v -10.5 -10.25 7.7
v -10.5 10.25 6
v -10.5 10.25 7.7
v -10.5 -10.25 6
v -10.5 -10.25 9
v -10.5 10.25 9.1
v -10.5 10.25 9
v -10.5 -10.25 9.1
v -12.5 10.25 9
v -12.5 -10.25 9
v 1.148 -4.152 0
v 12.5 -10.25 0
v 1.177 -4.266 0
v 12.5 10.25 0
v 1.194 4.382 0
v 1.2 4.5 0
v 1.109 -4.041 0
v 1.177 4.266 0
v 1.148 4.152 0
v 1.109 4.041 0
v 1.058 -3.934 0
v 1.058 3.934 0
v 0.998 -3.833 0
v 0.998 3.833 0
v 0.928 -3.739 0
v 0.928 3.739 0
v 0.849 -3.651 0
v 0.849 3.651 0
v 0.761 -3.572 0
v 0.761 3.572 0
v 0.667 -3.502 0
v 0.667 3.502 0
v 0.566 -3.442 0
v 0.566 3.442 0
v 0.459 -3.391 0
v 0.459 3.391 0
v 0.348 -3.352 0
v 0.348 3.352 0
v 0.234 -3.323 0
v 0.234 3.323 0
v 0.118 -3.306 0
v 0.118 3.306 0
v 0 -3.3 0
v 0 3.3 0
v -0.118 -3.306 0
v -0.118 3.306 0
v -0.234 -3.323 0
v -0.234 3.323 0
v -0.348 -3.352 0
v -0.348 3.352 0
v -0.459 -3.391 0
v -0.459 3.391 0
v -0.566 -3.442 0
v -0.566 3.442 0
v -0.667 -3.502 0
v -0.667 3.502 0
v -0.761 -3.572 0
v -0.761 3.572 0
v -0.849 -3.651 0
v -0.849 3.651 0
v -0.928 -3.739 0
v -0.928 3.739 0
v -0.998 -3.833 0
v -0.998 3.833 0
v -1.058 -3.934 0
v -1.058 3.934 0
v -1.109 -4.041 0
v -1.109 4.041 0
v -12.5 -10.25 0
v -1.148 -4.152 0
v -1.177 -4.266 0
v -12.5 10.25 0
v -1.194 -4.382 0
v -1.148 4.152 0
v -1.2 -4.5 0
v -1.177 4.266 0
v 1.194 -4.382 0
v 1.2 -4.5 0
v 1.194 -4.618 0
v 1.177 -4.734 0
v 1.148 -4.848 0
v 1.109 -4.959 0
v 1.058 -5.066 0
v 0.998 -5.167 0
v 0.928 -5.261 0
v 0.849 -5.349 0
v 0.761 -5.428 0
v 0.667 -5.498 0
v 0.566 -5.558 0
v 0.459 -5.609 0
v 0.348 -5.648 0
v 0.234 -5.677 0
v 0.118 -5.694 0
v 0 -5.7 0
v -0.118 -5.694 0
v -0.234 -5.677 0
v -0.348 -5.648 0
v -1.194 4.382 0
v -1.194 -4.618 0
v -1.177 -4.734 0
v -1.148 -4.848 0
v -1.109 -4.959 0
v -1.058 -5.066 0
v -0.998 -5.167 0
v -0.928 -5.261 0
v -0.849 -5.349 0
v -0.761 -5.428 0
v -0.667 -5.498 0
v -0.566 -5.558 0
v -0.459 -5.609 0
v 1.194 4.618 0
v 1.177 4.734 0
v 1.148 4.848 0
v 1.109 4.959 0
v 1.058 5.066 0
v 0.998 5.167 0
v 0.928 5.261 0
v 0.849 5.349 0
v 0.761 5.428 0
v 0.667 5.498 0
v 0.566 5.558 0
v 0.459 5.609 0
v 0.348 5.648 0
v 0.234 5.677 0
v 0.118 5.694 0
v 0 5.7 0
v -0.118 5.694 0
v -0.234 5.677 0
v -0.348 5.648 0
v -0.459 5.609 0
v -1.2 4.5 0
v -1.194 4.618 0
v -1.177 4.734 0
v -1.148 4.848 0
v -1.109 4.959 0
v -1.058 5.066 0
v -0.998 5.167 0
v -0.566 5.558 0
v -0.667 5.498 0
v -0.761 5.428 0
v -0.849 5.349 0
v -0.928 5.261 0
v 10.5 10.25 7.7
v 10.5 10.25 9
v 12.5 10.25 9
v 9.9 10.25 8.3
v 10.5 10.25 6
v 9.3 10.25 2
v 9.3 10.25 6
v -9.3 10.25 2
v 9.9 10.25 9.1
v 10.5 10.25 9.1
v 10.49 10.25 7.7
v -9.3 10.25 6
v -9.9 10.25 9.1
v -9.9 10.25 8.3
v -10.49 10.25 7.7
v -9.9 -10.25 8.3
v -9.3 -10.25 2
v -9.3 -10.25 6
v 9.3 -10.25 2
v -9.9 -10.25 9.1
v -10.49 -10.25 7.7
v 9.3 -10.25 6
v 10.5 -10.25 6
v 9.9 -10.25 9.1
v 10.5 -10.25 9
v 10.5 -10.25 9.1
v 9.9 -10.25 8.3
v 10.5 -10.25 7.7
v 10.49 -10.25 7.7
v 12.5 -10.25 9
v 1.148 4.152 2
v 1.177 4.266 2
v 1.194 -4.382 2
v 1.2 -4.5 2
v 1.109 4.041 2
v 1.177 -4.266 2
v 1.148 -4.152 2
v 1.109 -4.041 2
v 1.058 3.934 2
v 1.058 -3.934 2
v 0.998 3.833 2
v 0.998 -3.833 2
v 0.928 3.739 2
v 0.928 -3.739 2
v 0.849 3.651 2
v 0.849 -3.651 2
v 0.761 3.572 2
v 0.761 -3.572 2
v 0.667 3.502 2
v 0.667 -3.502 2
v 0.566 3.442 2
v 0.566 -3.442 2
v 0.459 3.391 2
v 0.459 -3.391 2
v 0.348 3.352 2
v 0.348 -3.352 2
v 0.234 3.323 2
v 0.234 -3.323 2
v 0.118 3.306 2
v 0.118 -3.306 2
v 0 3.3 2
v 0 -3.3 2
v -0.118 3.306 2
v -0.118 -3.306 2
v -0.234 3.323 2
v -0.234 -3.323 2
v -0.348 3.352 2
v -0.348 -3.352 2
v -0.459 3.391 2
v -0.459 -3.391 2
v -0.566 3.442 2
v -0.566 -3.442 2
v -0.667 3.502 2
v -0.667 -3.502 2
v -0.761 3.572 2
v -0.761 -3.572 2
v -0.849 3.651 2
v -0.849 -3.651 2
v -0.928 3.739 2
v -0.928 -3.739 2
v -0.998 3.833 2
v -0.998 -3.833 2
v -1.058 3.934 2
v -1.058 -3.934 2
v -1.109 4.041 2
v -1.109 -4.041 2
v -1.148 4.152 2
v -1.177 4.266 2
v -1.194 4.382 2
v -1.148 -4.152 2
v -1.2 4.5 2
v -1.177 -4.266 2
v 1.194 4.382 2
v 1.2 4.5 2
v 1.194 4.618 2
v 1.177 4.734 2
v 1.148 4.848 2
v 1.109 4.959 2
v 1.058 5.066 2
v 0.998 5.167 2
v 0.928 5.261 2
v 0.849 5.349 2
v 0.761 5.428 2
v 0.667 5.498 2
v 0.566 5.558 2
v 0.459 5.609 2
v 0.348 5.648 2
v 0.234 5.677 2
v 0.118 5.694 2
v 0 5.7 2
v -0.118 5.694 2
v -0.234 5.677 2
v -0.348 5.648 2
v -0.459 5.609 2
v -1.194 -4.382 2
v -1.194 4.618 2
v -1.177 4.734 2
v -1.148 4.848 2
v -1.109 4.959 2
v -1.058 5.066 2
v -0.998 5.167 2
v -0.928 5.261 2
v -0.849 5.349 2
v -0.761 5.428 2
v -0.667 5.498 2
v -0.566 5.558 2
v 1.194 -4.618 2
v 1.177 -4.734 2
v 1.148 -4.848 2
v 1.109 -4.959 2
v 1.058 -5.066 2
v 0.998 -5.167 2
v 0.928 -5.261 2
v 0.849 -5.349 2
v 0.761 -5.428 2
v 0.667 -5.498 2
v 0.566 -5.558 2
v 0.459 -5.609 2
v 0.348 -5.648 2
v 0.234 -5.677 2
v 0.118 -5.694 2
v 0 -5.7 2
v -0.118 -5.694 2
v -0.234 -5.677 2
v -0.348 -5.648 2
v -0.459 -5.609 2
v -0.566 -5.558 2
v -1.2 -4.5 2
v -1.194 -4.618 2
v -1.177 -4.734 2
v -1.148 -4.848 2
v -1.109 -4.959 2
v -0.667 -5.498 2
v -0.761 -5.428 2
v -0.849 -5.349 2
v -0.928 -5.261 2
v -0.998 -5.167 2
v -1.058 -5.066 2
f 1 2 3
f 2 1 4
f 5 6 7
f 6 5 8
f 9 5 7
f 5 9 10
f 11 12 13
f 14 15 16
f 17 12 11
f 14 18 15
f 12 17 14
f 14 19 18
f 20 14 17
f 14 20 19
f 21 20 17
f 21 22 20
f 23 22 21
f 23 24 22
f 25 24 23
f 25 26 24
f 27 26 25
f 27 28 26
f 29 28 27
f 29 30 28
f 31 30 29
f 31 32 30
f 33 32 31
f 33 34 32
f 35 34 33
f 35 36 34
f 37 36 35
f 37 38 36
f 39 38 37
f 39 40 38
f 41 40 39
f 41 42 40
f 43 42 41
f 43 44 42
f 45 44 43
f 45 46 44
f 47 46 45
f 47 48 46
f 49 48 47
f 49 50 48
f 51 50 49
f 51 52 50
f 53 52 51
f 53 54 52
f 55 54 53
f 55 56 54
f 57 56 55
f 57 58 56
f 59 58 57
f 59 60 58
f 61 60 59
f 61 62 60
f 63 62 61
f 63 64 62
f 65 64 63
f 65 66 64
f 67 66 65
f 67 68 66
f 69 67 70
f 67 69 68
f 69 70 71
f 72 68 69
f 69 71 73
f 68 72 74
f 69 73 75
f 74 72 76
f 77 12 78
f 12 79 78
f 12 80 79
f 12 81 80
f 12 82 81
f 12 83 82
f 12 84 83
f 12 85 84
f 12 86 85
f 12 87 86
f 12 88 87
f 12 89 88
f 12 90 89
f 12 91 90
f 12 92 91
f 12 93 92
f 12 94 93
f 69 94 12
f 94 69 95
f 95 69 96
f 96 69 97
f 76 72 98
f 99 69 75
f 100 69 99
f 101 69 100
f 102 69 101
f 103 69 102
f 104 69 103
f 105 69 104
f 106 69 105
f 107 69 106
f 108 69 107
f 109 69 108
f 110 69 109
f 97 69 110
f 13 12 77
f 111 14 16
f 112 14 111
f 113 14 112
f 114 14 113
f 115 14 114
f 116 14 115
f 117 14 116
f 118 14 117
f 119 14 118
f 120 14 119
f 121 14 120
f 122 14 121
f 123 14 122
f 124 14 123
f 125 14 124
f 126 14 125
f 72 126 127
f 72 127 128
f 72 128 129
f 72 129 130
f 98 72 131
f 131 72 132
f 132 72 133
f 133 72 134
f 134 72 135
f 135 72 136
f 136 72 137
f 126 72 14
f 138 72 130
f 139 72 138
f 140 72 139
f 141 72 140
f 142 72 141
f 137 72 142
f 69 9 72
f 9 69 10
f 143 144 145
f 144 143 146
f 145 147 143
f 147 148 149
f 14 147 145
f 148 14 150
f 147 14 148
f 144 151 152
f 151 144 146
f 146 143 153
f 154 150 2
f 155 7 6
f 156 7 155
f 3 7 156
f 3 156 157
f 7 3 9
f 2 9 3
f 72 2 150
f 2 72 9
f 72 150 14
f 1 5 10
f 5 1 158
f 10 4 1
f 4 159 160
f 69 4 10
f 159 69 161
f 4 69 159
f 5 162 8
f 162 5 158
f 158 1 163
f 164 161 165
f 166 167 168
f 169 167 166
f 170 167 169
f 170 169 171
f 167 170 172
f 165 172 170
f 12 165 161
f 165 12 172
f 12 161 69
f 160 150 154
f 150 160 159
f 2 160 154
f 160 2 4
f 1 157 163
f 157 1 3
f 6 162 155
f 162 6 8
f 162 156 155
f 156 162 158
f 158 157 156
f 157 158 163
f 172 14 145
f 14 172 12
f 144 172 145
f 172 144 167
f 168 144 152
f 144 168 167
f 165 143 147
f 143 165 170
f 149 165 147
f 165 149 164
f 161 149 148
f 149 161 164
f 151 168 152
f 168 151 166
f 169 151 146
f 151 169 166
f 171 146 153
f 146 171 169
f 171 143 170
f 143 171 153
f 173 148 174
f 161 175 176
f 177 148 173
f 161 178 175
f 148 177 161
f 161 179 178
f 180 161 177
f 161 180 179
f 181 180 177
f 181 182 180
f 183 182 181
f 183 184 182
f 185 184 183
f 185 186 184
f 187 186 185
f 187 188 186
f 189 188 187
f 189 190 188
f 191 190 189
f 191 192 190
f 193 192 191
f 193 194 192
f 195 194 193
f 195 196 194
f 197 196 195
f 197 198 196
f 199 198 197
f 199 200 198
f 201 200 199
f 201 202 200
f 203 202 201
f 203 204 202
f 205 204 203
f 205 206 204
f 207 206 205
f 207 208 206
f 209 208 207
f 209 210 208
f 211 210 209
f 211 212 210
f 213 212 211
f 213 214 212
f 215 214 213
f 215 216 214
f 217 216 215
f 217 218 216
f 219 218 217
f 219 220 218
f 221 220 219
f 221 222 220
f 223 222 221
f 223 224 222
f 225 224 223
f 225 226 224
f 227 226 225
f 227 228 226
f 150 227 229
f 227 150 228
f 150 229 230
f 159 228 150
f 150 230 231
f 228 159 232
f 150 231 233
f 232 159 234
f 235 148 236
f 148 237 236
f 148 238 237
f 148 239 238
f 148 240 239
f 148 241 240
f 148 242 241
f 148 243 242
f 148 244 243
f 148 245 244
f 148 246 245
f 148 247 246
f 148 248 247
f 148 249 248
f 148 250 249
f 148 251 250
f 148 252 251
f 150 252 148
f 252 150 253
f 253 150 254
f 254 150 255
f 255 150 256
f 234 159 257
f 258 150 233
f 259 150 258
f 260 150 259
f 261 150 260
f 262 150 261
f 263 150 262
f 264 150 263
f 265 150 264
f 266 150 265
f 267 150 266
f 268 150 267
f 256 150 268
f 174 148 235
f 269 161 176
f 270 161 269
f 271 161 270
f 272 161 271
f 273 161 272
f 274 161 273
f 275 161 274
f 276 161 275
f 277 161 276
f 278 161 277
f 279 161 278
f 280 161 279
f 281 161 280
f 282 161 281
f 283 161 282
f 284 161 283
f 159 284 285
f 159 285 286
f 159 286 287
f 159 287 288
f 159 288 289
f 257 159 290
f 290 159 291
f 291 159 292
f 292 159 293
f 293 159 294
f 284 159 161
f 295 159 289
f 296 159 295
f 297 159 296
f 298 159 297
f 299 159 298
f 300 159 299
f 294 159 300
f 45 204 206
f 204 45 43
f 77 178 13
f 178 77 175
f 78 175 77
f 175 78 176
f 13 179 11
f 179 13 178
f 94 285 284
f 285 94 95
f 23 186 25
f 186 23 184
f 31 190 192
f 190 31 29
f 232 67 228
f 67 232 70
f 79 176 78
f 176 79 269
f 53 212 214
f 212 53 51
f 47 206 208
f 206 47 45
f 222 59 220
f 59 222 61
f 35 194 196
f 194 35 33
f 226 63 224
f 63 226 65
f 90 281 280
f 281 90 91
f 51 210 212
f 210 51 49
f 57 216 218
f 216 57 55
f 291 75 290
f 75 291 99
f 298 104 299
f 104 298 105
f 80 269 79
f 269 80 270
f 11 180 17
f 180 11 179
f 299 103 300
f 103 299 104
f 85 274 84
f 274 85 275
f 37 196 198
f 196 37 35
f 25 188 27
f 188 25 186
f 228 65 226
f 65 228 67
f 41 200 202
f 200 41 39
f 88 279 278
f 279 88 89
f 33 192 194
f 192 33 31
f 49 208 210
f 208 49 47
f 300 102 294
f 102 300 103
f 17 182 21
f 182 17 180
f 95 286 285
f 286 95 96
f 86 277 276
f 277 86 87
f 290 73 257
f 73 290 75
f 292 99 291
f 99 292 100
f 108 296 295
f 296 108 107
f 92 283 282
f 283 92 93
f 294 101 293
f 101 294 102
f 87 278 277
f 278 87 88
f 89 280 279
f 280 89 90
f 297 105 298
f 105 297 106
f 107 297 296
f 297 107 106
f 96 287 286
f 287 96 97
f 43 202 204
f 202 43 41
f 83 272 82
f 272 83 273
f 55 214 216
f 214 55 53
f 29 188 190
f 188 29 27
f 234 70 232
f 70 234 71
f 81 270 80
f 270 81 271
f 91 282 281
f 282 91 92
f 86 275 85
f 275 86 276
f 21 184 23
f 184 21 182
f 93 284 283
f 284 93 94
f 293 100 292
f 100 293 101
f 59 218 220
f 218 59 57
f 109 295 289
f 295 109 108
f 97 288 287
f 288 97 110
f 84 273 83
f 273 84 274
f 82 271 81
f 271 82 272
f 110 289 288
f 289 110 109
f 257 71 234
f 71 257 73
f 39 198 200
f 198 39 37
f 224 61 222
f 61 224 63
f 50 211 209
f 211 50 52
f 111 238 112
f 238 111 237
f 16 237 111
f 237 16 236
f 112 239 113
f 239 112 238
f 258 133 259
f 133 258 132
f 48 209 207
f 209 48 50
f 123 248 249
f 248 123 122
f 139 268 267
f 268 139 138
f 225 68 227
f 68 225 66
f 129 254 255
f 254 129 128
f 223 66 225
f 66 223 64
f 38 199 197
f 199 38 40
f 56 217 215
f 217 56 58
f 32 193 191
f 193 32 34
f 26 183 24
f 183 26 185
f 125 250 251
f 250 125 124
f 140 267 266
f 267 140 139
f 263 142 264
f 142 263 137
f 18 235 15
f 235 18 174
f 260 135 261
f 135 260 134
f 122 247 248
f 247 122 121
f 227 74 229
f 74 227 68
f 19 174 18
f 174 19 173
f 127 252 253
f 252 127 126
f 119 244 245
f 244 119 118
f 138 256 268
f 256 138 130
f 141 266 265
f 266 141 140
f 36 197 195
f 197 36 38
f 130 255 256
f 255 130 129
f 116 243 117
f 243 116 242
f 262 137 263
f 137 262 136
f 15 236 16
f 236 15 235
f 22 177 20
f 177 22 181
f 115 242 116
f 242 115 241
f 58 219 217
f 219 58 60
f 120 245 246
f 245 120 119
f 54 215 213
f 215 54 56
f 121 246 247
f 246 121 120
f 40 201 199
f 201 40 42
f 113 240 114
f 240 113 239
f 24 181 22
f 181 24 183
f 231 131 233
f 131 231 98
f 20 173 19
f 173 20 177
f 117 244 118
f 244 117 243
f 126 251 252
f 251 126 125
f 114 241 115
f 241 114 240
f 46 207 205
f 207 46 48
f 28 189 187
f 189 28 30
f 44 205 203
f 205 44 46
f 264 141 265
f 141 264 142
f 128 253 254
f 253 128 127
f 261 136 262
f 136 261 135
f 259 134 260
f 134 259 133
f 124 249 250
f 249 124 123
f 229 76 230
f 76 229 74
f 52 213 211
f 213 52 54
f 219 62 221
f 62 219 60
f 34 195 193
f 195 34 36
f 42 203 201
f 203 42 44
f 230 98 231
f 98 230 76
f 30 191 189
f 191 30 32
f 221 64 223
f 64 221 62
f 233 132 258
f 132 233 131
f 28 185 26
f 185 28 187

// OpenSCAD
// file: ../lib.scad
// Solar Rover - shared helper modules
include <config.scad>

// Rounded rectangle plate, centred in XY, sitting on Z=0.
module rbox(size, r=4) {
    x = size[0]; y = size[1]; z = size[2];
    hull() for (sx=[-1,1], sy=[-1,1])
        translate([sx*(x/2-r), sy*(y/2-r), 0]) cylinder(r=r, h=z);
}

// Vertical hole through everything (subtract). Centred on the origin.
module hole(d, h=200) { translate([0,0,-h/2]) cylinder(d=d, h=h); }

// Heat-set insert pocket opening upward at Z=top.
module insert_m3(top) { translate([0,0,top-m3_insert_h]) cylinder(d=m3_insert_d, h=m3_insert_h+0.01); }
module insert_m25(top) { translate([0,0,top-4.5]) cylinder(d=m25_insert_d, h=4.51); }

// Boss for an insert: cylinder from z0 to z1, with insert pocket at the top.
module insert_boss_m3(z0, z1, od=8) {
    difference() {
        translate([0,0,z0]) cylinder(d=od, h=z1-z0);
        insert_m3(z1);
    }
}

// Slot of length l (centre-to-centre) along X, diameter d.
module slot(l, d, h=200) {
    hull() for (sx=[-1,1]) translate([sx*l/2,0,-h/2]) cylinder(d=d, h=h);
}

// Counterbored M3 clearance hole, head at Z=top going down.
module m3_cbore(top, depth=m3_head_h) {
    hole(m3_clear);
    translate([0,0,top-depth]) cylinder(d=m3_head_d, h=depth+50);
}

// Captive hex nut pocket, opening at Z=z (nut goes in from that face).
module m3_nut_pocket(z, depth=m3_nut_h+0.4) {
    translate([0,0,z-depth]) cylinder(d=m3_nut_af/cos(30), h=depth+0.01, $fn=6);
}

// Pair of zip-tie slots (for modules without mounting holes), spaced s apart along X.
module zip_slots(s=30, w=4, l=2.2) {
    for (sx=[-1,1]) translate([sx*s/2,0,0]) cube([l, w, 50], center=true);
}

// D-shaped bore for TT motor shafts.
module d_bore(h=50, extra=0) {
    intersection() {
        cylinder(d=tt_shaft_d+extra, h=h);
        translate([-(tt_shaft_d+extra)/2, -(tt_shaft_flat+extra)/2, 0])
            cube([tt_shaft_d+extra, tt_shaft_flat+extra, h]);
    }
}

// Simple spur gear (trapezoid teeth), module m, z teeth, thickness t. Good enough
// for a slow servo gripper; not a precision involute.
module spur_gear(m=1.25, z=16, t=6, bore=0) {
    rp = m*z/2; ra = rp + m; rf = rp - 1.25*m;
    difference() {
        linear_extrude(t) union() {
            circle(r=rf, $fn=z*4);
            for (i=[0:z-1]) rotate(i*360/z)
                polygon([[rf*cos(-90/z*1.1), rf*sin(-90/z*1.1)],
                         [ra*cos(-90/z*0.45), ra*sin(-90/z*0.45)],
                         [ra*cos( 90/z*0.45), ra*sin( 90/z*0.45)],
                         [rf*cos( 90/z*1.1), rf*sin( 90/z*1.1)]]);
        }
        if (bore > 0) hole(bore);
    }
}

// Servo pocket for an MG996R lying with its output axis along +Z.
// Case centred so the OUTPUT SHAFT is at the origin; case top at Z=0.
module mg996_case_neg(extra=tol) {
    translate([-mg996_shaft_off-extra, -mg996_w/2-extra, -mg996_h-extra])
        cube([mg996_l+2*extra, mg996_w+2*extra, mg996_h+extra+0.01]);
}
module mg996_flange_holes(d=m3_clear, h=60) {
    cx = mg996_l/2 - mg996_shaft_off;
    for (sx=[-1,1], sy=[-1,1])
        translate([cx+sx*mg996_hole_dx/2, sy*mg996_hole_dy/2, -h/2]) cylinder(d=d, h=h);
}
module mg90_case_neg(extra=tol) {
    translate([-mg90_shaft_off-extra, -mg90_w/2-extra, -mg90_h-extra])
        cube([mg90_l+2*extra, mg90_w+2*extra, mg90_h+extra+0.01]);
}
module mg90_flange_holes(d=m2_pilot, h=60) {
    cx = mg90_l/2 - mg90_shaft_off;
    for (sx=[-1,1]) translate([cx+sx*mg90_hole_dx/2, 0, -h/2]) cylinder(d=d, h=h);
}
// Round MG996R horn screw pattern (4 holes) + centre relief.
module mg996_horn_holes(d=m3_clear) {
    hole(9);
    for (a=[0:90:270]) rotate(a) translate([mg996_horn_hole_r,0,0]) hole(d);
}
// file: ../config.scad
// Solar Rover - shared dimensions (all mm)
// Coordinate system: X = forward, Y = left, Z = up. Origin = deck centre, ground at Z=0.
//
// Values marked MEASURE come from typical datasheets/clones and vary between
// suppliers. Measure your parts with calipers and edit them here before printing;
// every part reads its dimensions from this file.

$fn = 64;

// ---------- print / fit ----------
tol        = 0.25;   // general clearance per side
wall       = 2.4;    // default wall (6 perimeters at 0.4 mm nozzle)

// ---------- fasteners ----------
m3_clear     = 3.4;   // M3 clearance hole
m3_insert_d  = 4.1;   // hole for M3x5x4 brass heat-set insert (OD ~4.6)
m3_insert_h  = 5.5;   // insert hole depth
m3_head_d    = 6.2;   // socket head counterbore
m3_head_h    = 3.2;
m3_nut_af    = 5.6;   // nut across flats (+clearance)
m3_nut_h     = 2.6;
m25_clear    = 2.9;
m25_insert_d = 3.5;   // M2.5 insert hole (OD ~4.0)
m2_clear     = 2.4;
m2_pilot     = 1.7;   // pilot hole for M2 thread-forming screw

// ---------- deck ----------
deck_l     = 300;     // printed as two 150 mm halves
deck_w     = 146;
deck_t     = 4;
rib_h      = 8;
rib_w      = 2.4;
flange_h   = 14;      // joint flange (bolts the halves together)
flange_t   = 5;

// ---------- drive ----------
wheel_d       = 65;
wheel_w       = 26;
axle_z        = wheel_d/2;    // axle height above ground
axle_x        = 100;          // front axle at +axle_x, rear at -axle_x
// TT gear motor (dual-shaft, 1:48). MEASURE.
tt_body_l     = 64;           // along X (gearbox + motor can)
tt_body_t     = 22.5;         // along Y (shaft direction)
tt_body_h     = 18.8;         // along Z
tt_shaft_from_end = 11.3;     // shaft centre to gearbox front end
tt_shaft_d    = 5.4;          // D-shaft across round
tt_shaft_flat = 3.7;          // D-shaft across flats
tt_shaft_len  = 9;            // per side, beyond the body face
// two through-holes parallel to the shaft, positions relative to shaft centre [x, z]. MEASURE.
tt_holes      = [[-20.0, 5.5], [-20.0, -5.5]];
motor_outer_y = 72;           // motor face nearest the wheel
clamp_t       = 3;            // clamp plate thickness
deck_bottom_z = axle_z + tt_body_h/2 + clamp_t;   // 44.6
deck_top_z    = deck_bottom_z + deck_t;

// ---------- encoder ----------
enc_slots   = 20;
enc_disc_d  = 22;
enc_disc_t  = 1.6;

// ---------- turret / arm ----------
turret_x      = 108;
turret_d      = 84;           // base OD; top plate skirt overlaps it
turret_h      = 48;           // fixed base height above deck (servo hangs inside)
turret_deck_r = 30;           // 4x M3 at 45/135/225/315 deg: turret base to deck
turret_bolts  = [[20,28],[-20,28],[20,-28],[-20,-28]];  // module interface on the turret top (4x M3)
shoulder_z    = 45;           // shoulder axis above the turret top plate
// MG996R servo. MEASURE.
mg996_l   = 40.7;  mg996_w = 19.7;  mg996_h = 37.0;   // case (h = to top of case)
mg996_flange_l = 54.5; mg996_flange_z = 27.5;  mg996_flange_t = 2.5;
mg996_hole_dx = 49.5; mg996_hole_dy = 10.0; mg996_hole_d = 4.5;
mg996_shaft_off = 10.0;       // output shaft centre from case end
mg996_spline_h  = 6.0;        // case top to horn face
mg996_horn_d    = 22;         // round metal horn
mg996_horn_hole_r = 7.5;      // horn screw circle radius (MEASURE: usually 4 holes)
// MG90S servo. MEASURE.
mg90_l = 22.8; mg90_w = 12.2; mg90_h = 22.7;
mg90_flange_l = 32.5; mg90_flange_z = 16.0; mg90_flange_t = 2.5;
mg90_hole_dx = 27.6; mg90_hole_d = 2.0;
mg90_shaft_off = 6.0;
mg90_spline_h = 5.0;
mg90_horn_d = 7;              // horn hub (single-arm horn)

link_upper = 100;   // shoulder -> elbow
link_fore  = 90;    // elbow -> wrist
link_hand  = 70;    // wrist -> fingertip

// ---------- power / electronics ----------
cell_holder = [77, 80, 21];   // 4x18650 holder footprint. MEASURE.
pi0_holes   = [58, 23];       // Raspberry Pi Zero 2 W, M2.5
pca_holes   = [55.9, 19.0];   // Adafruit-style PCA9685, M2.5. MEASURE (clones vary)
esp_exp_holes = [47, 70];     // ESP32 38-pin screw-terminal expansion board (77x54 mm), M3. MEASURE.
cradle_tb6612 = [20.5, 20.5];  // TB6612FNG breakout board outline. MEASURE.
cradle_mp1584 = [22.4, 17.0];  // MP1584 mini buck outline. MEASURE.
cradle_e220   = [21.0, 36.0];  // Ebyte E220-900T22D LoRa module, without the SMA jack. MEASURE.
lora_x        = -162;          // E220 cradle centre: hangs under the rear roof tray's overhang,
lora_boss_dx  = -13;           //   SMA jack out the back; its 2 screws sit lora_boss_dx behind
lora_boss_dy  = 6;             //   the centre, +-lora_boss_dy to the sides (M3 inserts in the tray)
module_slot_w = 2.6;          // module-plate slots: M2/M2.5 screw + nut, or a 2.5 mm zip tie
tray_standoff_h = 32;         // power tray top to logic tray underside
// charge tray: a slotted plate on 4 legs over the battery holder
charge_tray_c    = [-106, 0];         // centre on the deck (same as the battery holder)
charge_tray_size = [76, 102];         // X, Y
charge_tray_z    = 24;                // deck top to plate underside (holder is 21 mm tall)
charge_tray_legs = [for (x=[-34,28], sy=[-1,1]) [x, sy*46]];   // relative to the centre; the front pair clears the motor-clamp inserts

// ---------- body / solar ----------
panel     = [110, 136, 3];    // 6V 2W panel: X, Y, thickness. MEASURE.
roof_post_h = 75;             // deck top to roof tray underside (room for plugged-in jumpers)
tray_frame  = 4;
roof_front_x = 60;            // front tray spans -60..60, rear tray -180..-60
// main file
// Module cradle (print 2x tb6612, 1x mp1584, 1x e220): a snap-in holder for the
// small boards that have no screw holes. The board drops in between the two end
// walls, rests on the ledges and clicks under the lips; the other two sides
// stay open for header pins and wires (solder the TB6612 headers pins-up).
// Two M2 x 8 screws go down through the floor and a pair of tray slots (9 mm
// apart, like the slot rows) into M2 nuts under the tray. Print floor down.
// The e220 variant holds the LoRa module (pins up, shield down between the
// ledges, SMA jack out of the open +Y end). It hangs upside down under the rear
// roof tray on 2x M3x8 into the tray's inserts, screwed in before the module
// clicks in; a zip tie round cradle and module stops it shaking loose.
//   -D 'variant="tb6612"' | "mp1584" | "e220"   or  -D 'board=[x,y]' for any other board
include <../config.scad>
use <../lib.scad>

variant = "tb6612";
board = variant == "mp1584" ? cradle_mp1584 : variant == "e220" ? cradle_e220 : cradle_tb6612;
// e220: two M3 holes across the cradle near the SMA end (they meet the roof
// tray inserts, see lora_boss_* in config.scad); others: M2, 9 mm apart along Y
holes = variant == "e220" ? [[-lora_boss_dy, -lora_boss_dx], [lora_boss_dy, -lora_boss_dx]] : [[0, -4.5], [0, 4.5]];
hole_d = variant == "e220" ? m3_clear : m2_clear;
board_t = 1.6;
floor_t = 2;
wall = 2;
ledge_h = 4;          // board underside above the floor (screw heads, solder tails)
ledge_w = 1.2;
lip = 0.6;
ix = board[0] + 2*tol;               // inner length between the end walls
oy = board[1];                       // cradle width = board width
h = floor_t + ledge_h + board_t + 1.4;

difference() {
    union() {
        translate([-(ix/2+wall), -oy/2, 0]) cube([ix + 2*wall, oy, floor_t]);
        for (sx=[-1,1]) {
            // end wall
            translate([sx > 0 ? ix/2 : -ix/2-wall, -oy/2, 0]) cube([wall, oy, h]);
            // ledge the board rests on
            translate([sx > 0 ? ix/2-ledge_w : -ix/2, -oy/2, 0]) cube([ledge_w, oy, floor_t + ledge_h]);
            // snap lip above the board, chamfered underneath so it prints and clicks
            hull() {
                translate([sx > 0 ? ix/2-lip : -ix/2, -oy/2, floor_t + ledge_h + board_t + 0.1 + lip]) cube([lip, oy, 0.8]);
                translate([sx > 0 ? ix/2-0.01 : -ix/2, -oy/2, floor_t + ledge_h + board_t + 0.1]) cube([0.01, oy, 0.01]);
            }
        }
    }
    // mounting holes
    for (h=holes) translate([h[0], h[1], 0]) hole(hole_d);
}
